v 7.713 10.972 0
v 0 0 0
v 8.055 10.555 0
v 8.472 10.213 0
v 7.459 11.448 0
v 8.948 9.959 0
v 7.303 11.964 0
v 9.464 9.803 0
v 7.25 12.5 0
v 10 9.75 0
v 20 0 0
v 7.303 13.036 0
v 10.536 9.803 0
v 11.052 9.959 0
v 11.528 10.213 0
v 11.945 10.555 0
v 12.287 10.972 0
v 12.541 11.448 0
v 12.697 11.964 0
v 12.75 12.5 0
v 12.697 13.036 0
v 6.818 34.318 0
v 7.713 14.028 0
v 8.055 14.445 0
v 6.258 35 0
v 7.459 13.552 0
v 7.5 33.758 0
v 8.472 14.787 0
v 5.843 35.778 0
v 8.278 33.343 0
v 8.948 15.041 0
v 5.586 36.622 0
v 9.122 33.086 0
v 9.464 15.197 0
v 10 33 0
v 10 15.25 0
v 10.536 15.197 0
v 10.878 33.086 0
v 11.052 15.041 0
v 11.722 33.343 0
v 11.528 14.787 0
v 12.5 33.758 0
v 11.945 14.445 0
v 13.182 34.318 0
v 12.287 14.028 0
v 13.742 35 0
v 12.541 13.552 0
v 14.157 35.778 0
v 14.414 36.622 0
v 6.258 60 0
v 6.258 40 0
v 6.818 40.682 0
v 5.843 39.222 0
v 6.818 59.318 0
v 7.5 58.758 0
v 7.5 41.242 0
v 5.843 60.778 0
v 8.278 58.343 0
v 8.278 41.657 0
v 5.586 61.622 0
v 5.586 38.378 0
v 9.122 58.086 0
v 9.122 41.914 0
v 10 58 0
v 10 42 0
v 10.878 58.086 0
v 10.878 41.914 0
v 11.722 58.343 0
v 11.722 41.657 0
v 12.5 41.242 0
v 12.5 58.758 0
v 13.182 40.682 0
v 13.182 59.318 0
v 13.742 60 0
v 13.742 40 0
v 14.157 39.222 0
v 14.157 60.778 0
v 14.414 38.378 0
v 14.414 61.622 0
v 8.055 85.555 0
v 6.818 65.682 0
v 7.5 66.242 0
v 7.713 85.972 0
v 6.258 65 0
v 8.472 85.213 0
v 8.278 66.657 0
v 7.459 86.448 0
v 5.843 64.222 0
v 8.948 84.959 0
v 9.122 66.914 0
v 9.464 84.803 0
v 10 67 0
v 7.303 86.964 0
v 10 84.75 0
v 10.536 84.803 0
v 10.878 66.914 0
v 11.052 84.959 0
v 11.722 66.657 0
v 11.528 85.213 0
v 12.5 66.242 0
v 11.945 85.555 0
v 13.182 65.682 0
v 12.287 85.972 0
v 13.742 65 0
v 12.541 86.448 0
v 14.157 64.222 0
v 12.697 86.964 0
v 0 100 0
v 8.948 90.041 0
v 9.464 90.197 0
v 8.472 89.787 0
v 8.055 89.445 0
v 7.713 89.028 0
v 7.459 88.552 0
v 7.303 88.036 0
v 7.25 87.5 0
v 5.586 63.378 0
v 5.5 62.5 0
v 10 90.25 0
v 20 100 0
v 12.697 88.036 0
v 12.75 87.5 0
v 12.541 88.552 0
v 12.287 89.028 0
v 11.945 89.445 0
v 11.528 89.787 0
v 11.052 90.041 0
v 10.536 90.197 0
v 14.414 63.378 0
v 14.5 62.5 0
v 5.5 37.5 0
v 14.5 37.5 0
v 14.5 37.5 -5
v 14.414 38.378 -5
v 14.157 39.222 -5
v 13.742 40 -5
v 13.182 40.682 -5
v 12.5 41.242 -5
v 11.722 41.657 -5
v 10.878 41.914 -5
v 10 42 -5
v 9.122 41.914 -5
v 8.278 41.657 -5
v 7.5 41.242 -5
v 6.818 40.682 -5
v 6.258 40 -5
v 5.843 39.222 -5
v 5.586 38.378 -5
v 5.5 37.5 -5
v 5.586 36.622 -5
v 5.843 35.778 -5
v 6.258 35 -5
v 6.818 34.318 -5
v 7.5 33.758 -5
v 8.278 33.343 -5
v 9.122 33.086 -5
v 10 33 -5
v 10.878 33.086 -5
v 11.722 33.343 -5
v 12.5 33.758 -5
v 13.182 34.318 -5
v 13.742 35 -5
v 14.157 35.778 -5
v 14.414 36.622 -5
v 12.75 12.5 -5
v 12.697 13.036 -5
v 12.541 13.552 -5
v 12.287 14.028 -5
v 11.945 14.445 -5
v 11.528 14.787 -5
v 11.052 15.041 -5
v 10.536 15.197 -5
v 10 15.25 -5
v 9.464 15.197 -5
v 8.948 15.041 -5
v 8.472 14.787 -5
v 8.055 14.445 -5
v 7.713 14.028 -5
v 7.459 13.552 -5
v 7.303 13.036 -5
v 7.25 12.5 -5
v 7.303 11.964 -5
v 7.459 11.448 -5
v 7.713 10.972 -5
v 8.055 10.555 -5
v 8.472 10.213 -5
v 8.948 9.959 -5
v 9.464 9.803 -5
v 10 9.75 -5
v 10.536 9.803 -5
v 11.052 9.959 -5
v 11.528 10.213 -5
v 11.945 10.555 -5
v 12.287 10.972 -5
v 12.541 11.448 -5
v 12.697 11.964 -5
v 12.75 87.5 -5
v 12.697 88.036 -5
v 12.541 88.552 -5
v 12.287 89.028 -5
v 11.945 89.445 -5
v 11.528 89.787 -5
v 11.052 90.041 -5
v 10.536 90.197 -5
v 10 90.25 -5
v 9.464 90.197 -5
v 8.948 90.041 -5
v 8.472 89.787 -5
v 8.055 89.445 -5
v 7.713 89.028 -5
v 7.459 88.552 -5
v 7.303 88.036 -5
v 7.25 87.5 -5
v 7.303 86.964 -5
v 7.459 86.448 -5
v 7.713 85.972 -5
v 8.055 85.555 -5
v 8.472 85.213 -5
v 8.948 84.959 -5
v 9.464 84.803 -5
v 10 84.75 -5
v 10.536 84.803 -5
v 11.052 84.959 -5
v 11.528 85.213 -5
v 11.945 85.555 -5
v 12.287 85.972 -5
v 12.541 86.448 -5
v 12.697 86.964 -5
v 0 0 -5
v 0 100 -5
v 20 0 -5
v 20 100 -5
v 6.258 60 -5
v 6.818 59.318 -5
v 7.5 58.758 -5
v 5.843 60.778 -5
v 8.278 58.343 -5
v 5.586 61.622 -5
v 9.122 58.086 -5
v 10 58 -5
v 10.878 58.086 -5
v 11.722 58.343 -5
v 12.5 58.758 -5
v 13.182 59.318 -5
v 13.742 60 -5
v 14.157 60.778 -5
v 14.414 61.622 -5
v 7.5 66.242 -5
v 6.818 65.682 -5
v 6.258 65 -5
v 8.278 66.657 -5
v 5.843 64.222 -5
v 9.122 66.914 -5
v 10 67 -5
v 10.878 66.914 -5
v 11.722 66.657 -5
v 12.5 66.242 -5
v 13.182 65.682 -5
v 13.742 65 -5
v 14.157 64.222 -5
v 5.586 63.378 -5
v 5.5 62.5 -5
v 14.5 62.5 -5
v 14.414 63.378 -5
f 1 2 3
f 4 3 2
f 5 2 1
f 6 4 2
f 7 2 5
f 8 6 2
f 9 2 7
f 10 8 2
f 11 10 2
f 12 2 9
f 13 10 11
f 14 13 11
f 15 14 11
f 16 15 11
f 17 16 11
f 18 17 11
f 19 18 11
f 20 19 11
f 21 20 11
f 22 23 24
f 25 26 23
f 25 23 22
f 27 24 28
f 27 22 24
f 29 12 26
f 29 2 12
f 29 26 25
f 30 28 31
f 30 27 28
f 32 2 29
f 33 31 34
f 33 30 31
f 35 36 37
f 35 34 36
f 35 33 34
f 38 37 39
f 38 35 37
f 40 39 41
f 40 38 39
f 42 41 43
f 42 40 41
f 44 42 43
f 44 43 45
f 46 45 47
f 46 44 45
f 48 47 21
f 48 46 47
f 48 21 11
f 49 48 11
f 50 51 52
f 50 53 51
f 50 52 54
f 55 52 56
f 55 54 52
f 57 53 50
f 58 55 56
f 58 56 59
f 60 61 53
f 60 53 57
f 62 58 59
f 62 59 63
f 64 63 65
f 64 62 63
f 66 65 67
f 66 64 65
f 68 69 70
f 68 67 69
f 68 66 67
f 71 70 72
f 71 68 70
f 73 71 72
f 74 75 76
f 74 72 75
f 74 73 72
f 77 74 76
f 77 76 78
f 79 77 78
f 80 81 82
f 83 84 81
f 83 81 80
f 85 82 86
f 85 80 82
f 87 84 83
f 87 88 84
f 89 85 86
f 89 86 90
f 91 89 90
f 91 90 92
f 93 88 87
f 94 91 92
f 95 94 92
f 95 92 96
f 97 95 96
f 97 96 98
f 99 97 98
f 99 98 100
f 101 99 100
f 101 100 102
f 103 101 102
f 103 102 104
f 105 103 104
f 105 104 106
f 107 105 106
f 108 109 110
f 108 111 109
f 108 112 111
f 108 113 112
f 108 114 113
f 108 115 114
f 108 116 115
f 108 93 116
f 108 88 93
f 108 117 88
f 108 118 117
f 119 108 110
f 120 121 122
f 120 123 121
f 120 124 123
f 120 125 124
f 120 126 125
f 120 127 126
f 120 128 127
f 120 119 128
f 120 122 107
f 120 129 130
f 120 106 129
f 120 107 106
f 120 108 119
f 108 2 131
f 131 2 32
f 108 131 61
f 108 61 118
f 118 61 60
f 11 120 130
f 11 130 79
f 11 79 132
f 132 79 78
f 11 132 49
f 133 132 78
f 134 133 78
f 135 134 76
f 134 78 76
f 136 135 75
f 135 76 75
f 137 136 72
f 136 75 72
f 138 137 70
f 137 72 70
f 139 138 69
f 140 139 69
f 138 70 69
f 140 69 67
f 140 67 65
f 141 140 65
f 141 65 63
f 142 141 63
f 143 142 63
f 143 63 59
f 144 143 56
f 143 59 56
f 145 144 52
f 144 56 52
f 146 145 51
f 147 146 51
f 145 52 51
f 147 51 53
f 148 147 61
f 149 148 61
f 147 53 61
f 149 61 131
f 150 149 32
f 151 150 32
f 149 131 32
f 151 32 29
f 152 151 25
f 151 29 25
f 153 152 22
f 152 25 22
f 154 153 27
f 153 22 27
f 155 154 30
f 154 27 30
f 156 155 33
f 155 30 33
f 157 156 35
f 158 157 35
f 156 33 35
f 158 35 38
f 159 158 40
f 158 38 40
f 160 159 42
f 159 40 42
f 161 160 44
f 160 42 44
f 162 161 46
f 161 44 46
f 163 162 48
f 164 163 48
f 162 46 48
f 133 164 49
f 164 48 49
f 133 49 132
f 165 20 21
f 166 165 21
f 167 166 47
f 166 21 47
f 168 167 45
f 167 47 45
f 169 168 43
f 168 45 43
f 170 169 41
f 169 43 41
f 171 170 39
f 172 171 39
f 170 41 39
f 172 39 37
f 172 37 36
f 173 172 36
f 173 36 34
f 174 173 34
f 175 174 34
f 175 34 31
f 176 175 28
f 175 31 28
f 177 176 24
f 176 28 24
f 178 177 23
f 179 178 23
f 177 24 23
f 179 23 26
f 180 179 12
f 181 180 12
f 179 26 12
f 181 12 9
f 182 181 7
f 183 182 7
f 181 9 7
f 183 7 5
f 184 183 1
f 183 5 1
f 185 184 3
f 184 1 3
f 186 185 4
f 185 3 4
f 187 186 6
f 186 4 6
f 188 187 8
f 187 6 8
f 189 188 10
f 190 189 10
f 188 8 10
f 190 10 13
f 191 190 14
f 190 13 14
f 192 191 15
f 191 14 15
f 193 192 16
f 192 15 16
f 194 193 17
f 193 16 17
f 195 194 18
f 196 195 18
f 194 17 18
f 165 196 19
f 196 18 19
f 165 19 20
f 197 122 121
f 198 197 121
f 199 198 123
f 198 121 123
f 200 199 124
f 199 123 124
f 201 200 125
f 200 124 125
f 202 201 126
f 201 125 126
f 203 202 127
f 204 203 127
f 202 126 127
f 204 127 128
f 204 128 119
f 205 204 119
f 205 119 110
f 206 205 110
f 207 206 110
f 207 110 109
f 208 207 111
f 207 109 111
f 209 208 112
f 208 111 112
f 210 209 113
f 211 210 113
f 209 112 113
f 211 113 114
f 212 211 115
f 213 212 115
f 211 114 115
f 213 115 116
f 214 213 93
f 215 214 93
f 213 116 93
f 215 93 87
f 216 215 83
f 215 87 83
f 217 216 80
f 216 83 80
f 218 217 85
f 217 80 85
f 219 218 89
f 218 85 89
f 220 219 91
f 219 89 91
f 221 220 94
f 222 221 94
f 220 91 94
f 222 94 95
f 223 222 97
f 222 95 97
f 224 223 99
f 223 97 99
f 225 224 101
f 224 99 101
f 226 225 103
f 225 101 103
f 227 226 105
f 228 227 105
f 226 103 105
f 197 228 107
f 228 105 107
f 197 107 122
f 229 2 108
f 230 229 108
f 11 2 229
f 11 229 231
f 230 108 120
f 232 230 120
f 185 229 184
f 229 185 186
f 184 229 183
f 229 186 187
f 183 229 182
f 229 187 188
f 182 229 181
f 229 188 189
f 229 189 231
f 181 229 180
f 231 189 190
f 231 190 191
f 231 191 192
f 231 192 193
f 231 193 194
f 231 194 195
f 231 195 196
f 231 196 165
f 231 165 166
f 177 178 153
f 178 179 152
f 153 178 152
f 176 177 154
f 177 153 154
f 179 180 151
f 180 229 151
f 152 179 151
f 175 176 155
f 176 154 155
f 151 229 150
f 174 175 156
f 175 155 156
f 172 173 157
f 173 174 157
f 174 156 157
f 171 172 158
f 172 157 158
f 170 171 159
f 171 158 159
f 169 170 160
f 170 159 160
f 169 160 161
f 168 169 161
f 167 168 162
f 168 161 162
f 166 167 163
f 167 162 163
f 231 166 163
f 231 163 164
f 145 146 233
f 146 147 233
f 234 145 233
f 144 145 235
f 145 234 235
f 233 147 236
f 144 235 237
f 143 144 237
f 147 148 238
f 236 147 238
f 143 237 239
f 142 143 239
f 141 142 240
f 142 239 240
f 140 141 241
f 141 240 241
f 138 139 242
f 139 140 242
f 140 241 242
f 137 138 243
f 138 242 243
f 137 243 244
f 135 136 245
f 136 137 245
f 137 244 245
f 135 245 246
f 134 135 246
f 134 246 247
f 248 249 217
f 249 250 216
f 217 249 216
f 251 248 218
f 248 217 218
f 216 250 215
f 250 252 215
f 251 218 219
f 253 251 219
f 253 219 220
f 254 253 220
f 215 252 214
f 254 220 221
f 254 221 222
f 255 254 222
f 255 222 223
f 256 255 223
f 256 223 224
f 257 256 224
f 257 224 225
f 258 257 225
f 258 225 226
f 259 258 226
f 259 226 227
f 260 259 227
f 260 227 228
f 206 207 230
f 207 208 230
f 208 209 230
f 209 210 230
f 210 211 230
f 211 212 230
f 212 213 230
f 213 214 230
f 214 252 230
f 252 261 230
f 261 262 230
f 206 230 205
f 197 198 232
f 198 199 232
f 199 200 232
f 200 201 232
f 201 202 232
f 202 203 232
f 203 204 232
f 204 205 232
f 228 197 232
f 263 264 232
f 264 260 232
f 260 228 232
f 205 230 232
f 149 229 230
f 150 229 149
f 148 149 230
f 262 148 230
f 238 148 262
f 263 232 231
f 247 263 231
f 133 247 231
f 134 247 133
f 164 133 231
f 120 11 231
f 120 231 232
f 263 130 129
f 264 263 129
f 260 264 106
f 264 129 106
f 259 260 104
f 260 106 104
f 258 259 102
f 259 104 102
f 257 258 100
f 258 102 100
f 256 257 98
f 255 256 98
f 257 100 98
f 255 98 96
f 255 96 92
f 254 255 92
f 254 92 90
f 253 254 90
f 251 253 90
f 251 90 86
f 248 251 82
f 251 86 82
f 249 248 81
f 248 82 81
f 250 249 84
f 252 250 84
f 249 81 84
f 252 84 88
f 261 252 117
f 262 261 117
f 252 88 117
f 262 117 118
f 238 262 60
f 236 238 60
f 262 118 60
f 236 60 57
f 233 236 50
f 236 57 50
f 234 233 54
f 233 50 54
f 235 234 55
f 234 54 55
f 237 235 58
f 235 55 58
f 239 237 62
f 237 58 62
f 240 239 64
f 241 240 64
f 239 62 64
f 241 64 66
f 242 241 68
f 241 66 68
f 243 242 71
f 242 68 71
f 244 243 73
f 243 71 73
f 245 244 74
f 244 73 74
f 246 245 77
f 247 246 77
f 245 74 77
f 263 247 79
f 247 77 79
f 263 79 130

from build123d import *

# Parameters (mm, degrees)
ESQUISSE1_W        = 20
ESQUISSE1_H        = 100
ESQUISSE1_R        = 4.5
ESQUISSE1_R_2      = 2.75
BOSS_EXTRU_2_DEPTH = 5


with BuildPart() as part:
    # Esquisse1 → Boss.-Extru.2 (new body)
    # profile 1 of 3: a face of its own
    with BuildSketch(Plane.XY):
        with Locations((10, 50)):
            Rectangle(ESQUISSE1_W, ESQUISSE1_H)
        with Locations((10, 37.5)):
            Circle(ESQUISSE1_R, mode=Mode.SUBTRACT)
        with Locations((10, 62.5)):
            Circle(ESQUISSE1_R, mode=Mode.SUBTRACT)
        Polygon((10, 82.881197846), (14, 85.190598923), (14, 89.809401077), (10, 92.118802154), (6, 89.809401077), (6, 85.190598923), align=None, mode=Mode.SUBTRACT)
        Polygon((10, 7.881197846), (14, 10.190598923), (14, 14.809401077), (10, 17.118802154), (6, 14.809401077), (6, 10.190598923), align=None, mode=Mode.SUBTRACT)
    # profile 2 of 3: a face of its own
    with BuildSketch(Plane.XY):
        Polygon((6, 85.190598923), (10, 82.881197846), (14, 85.190598923), (14, 89.809401077), (10, 92.118802154), (6, 89.809401077), align=None)
        with Locations((10, 87.5)):
            Circle(ESQUISSE1_R_2, mode=Mode.SUBTRACT)
    # profile 3 of 3: a face of its own
    with BuildSketch(Plane.XY):
        Polygon((6, 10.190598923), (10, 7.881197846), (14, 10.190598923), (14, 14.809401077), (10, 17.118802154), (6, 14.809401077), align=None)
        with Locations((10, 12.5)):
            Circle(ESQUISSE1_R_2, mode=Mode.SUBTRACT)
    extrude(amount=-BOSS_EXTRU_2_DEPTH)


solid = part.part
